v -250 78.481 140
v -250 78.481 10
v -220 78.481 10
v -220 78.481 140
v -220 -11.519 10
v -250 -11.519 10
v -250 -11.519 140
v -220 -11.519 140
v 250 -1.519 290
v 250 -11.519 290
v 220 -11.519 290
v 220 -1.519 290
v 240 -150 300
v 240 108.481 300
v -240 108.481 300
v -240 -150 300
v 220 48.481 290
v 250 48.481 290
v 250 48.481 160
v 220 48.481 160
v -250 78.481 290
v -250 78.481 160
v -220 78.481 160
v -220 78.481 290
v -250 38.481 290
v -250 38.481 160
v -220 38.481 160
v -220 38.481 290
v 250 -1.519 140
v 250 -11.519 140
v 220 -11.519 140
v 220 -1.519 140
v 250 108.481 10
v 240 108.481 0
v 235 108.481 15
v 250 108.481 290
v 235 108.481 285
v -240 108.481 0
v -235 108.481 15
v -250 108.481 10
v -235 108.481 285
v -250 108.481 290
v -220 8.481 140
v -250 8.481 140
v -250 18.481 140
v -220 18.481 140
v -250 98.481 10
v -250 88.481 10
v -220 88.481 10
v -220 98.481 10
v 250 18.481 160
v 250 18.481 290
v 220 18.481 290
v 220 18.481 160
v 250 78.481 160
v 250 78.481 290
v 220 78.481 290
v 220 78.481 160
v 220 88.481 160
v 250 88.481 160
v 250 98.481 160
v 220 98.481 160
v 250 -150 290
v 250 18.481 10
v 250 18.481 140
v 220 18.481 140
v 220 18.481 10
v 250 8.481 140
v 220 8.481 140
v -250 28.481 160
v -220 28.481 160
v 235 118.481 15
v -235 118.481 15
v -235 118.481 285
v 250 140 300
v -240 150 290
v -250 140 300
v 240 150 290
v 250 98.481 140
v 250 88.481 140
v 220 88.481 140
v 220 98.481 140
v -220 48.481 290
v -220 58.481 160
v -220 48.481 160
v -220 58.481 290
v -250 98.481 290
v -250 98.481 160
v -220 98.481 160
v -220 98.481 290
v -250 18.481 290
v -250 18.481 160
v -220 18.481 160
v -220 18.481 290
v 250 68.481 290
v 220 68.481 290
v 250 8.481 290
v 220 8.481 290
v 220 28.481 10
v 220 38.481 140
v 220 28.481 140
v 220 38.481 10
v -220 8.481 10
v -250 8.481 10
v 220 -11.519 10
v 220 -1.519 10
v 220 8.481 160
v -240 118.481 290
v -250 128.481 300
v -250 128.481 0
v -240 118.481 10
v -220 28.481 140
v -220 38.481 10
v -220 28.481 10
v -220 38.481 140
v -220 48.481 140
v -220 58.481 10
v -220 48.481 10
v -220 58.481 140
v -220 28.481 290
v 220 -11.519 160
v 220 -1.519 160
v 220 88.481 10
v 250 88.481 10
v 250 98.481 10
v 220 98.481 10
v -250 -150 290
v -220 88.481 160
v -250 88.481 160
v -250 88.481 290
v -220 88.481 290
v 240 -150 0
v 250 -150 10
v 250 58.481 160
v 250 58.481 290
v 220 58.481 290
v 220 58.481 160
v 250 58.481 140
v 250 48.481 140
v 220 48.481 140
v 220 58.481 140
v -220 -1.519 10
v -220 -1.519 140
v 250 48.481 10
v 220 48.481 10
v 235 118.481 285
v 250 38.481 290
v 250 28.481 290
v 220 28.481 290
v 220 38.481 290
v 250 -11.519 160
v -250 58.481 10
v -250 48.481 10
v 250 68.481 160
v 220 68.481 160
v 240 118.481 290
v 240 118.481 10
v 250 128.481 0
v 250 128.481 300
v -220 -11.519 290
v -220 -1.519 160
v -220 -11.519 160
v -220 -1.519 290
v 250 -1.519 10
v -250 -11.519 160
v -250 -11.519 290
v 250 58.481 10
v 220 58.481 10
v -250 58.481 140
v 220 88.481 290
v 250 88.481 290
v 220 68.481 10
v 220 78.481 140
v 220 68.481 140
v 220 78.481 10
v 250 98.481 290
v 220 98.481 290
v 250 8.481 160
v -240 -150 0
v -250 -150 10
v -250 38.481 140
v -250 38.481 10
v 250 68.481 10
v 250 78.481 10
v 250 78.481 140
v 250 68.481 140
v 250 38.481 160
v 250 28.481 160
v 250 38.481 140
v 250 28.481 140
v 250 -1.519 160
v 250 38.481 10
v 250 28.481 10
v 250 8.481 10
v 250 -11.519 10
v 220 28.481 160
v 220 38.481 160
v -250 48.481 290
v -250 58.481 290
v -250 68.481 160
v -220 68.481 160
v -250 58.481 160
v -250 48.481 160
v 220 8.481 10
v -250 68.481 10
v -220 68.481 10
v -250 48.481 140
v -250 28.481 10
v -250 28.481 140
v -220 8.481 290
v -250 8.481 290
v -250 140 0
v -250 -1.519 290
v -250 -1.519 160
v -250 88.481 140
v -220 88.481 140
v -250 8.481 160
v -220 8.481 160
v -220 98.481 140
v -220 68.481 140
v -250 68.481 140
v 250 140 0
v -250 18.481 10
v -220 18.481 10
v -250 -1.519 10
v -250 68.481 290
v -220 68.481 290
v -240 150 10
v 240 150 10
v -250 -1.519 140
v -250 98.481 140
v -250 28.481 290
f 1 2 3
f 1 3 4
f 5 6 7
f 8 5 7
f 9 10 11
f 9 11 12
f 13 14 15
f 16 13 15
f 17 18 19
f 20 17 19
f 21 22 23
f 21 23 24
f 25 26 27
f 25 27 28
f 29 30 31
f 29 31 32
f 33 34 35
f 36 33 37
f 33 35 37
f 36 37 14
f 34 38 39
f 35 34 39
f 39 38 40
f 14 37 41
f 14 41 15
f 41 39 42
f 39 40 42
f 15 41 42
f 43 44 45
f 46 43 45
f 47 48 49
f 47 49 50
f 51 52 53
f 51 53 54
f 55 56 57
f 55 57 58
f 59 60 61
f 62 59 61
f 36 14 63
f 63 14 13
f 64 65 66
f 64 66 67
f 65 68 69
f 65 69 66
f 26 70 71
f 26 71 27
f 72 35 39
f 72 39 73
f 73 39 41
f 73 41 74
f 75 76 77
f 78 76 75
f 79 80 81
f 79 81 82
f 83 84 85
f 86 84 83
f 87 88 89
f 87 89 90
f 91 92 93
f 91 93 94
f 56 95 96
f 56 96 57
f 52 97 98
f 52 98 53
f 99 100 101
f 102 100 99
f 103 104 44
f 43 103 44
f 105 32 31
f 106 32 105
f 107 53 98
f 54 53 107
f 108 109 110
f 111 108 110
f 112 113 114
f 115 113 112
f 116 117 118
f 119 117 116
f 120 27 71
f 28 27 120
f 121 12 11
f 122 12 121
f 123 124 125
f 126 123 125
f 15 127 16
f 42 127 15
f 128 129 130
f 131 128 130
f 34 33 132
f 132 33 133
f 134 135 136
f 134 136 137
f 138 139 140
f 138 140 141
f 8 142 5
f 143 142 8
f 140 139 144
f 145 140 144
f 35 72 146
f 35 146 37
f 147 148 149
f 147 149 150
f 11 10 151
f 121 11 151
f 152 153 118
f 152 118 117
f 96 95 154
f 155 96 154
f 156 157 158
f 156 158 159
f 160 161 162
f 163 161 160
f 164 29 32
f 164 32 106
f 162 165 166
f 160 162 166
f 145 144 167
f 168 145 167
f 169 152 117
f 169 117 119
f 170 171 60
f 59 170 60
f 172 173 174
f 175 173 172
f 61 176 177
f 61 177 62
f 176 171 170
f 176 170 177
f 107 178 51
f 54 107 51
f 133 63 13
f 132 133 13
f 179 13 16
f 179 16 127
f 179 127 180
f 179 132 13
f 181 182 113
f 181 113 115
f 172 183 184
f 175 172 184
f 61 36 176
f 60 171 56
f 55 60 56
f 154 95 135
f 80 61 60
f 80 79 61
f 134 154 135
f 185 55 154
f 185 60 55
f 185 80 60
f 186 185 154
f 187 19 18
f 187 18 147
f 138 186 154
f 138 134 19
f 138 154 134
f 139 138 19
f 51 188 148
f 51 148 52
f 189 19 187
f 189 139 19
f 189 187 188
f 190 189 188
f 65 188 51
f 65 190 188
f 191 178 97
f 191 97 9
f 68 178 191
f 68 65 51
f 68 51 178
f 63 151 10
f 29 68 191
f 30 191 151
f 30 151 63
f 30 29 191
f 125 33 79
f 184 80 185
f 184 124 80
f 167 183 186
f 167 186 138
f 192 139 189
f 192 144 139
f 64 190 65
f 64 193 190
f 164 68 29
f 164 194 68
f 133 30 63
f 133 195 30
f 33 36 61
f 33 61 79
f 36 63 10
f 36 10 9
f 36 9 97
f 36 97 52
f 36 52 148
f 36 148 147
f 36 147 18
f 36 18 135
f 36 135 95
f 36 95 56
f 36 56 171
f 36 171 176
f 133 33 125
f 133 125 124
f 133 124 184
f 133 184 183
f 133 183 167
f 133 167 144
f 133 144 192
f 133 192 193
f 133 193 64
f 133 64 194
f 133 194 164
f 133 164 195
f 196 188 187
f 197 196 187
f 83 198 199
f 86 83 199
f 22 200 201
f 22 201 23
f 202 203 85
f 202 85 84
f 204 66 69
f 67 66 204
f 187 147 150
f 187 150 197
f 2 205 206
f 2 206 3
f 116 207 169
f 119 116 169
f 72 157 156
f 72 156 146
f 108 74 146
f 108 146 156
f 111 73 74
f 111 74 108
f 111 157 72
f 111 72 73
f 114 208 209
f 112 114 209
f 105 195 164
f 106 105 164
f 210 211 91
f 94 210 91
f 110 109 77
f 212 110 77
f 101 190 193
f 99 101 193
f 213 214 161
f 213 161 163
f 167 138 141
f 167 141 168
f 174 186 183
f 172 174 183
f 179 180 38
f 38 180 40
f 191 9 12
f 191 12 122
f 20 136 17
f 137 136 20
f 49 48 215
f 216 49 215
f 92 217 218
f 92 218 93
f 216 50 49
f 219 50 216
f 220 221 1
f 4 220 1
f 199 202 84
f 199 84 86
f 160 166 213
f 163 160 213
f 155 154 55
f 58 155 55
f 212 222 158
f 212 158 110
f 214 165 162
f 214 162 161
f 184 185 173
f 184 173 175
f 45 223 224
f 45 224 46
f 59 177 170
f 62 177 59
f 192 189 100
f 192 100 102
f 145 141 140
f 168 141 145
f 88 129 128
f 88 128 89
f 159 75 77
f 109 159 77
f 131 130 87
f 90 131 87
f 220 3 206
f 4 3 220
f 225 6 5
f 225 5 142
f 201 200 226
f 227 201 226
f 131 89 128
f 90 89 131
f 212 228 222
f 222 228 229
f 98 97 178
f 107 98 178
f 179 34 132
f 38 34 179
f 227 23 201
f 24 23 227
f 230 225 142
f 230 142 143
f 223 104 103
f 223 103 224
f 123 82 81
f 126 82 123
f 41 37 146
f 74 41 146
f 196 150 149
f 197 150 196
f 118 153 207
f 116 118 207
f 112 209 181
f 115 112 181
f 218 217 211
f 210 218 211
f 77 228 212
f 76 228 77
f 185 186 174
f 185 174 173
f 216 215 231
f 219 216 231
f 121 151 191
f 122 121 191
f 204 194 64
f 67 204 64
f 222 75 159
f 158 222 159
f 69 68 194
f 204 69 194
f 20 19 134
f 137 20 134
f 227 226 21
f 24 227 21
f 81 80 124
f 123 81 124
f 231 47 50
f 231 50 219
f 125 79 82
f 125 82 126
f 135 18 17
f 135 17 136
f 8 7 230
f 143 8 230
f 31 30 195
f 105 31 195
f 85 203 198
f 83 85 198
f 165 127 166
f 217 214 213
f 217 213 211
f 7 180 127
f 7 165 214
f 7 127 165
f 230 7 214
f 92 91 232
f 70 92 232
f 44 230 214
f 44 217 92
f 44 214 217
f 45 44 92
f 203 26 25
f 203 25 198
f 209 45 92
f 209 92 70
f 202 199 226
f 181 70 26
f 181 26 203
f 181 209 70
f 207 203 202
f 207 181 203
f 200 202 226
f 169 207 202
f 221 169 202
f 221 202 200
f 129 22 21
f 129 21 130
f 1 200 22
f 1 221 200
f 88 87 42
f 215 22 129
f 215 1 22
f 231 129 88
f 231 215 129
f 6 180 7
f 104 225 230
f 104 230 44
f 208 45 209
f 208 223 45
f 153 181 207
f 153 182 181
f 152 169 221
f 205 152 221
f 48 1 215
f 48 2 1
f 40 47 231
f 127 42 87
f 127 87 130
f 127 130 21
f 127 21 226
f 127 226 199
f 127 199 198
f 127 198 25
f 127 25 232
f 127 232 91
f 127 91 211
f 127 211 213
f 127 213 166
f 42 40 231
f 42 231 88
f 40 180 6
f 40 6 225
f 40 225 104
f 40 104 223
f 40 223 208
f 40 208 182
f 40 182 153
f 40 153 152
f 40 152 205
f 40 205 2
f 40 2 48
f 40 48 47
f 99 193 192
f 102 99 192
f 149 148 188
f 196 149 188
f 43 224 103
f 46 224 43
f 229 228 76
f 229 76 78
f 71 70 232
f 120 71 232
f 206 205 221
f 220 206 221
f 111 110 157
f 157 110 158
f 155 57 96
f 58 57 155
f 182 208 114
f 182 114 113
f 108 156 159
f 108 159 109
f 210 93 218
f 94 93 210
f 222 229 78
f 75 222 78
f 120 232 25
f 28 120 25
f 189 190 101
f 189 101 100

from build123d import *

# Parameters (mm, degrees)
BOSS_EXTRUDE1_DEPTH = 300
SKETCH2_W           = 15
SKETCH2_H           = 10
CUT_EXTRUDE1_DEPTH  = 603.07972894
SKETCH4_W           = 130
SKETCH4_H           = 10
CUT_EXTRUDE2_DEPTH  = 30
SKETCH7_W           = 130
SKETCH7_H           = 10
CUT_EXTRUDE3_DEPTH  = 30
CHAMFER1_SIZE       = 10
CHAMFER2_SIZE       = 10
CHAMFER3_SIZE       = 10


with BuildPart() as part:
    # Sketch1 → Boss-Extrude1 (new body)
    with BuildSketch(Plane.XY):
        Polygon((250, 118.480565371), (235, 118.480565371), (235, 108.480565371), (250, 108.480565371), (250, -150), (-250, -150), (-250, 108.480565371), (-235, 108.480565371), (-235, 118.480565371), (-250, 118.480565371), (-250, 150), (250, 150), align=None)
    extrude(amount=BOSS_EXTRUDE1_DEPTH)

    # Sketch2 → Cut-Extrude1 (cut, through all)
    with BuildSketch(Plane.ZY.offset(250)):
        with Locations((292.5, 113.480565371)):
            Rectangle(SKETCH2_W, SKETCH2_H)
        with Locations((7.5, 113.480565371)):
            Rectangle(SKETCH2_W, SKETCH2_H)
    extrude(amount=-CUT_EXTRUDE1_DEPTH, mode=Mode.SUBTRACT)

    # Sketch4 → Cut-Extrude2 (cut)
    with BuildSketch(Plane.ZY.offset(250)):
        with Locations((75, 93.480565371)):
            Rectangle(SKETCH4_W, SKETCH4_H)
        with Locations((225, 93.480565371)):
            Rectangle(SKETCH4_W, SKETCH4_H)
        with Locations((225, 73.480565371)):
            Rectangle(SKETCH4_W, SKETCH4_H)
        with Locations((225, 53.480565371)):
            Rectangle(SKETCH4_W, SKETCH4_H)
        with Locations((225, 33.480565371)):
            Rectangle(SKETCH4_W, SKETCH4_H)
        with Locations((225, 13.480565371)):
            Rectangle(SKETCH4_W, SKETCH4_H)
        with Locations((225, -6.519434629)):
            Rectangle(SKETCH4_W, SKETCH4_H)
        with Locations((75, 73.480565371)):
            Rectangle(SKETCH4_W, SKETCH4_H)
        with Locations((75, 53.480565371)):
            Rectangle(SKETCH4_W, SKETCH4_H)
        with Locations((75, 33.480565371)):
            Rectangle(SKETCH4_W, SKETCH4_H)
        with Locations((75, 13.480565371)):
            Rectangle(SKETCH4_W, SKETCH4_H)
        with Locations((75, -6.519434629)):
            Rectangle(SKETCH4_W, SKETCH4_H)
    extrude(amount=-CUT_EXTRUDE2_DEPTH, mode=Mode.SUBTRACT)

    # Sketch7 → Cut-Extrude3 (cut)
    with BuildSketch(Plane(origin=(250, 0, 0), x_dir=(0, 0, -1), z_dir=(1, 0, 0))):
        with Locations((-225, 93.480565371)):
            Rectangle(SKETCH7_W, SKETCH7_H)
        with Locations((-75, 93.480565371)):
            Rectangle(SKETCH7_W, SKETCH7_H)
        with Locations((-75, 73.480565371)):
            Rectangle(SKETCH7_W, SKETCH7_H)
        with Locations((-75, 53.480565371)):
            Rectangle(SKETCH7_W, SKETCH7_H)
        with Locations((-75, 33.480565371)):
            Rectangle(SKETCH7_W, SKETCH7_H)
        with Locations((-75, 13.480565371)):
            Rectangle(SKETCH7_W, SKETCH7_H)
        with Locations((-75, -6.519434629)):
            Rectangle(SKETCH7_W, SKETCH7_H)
        with Locations((-225, 73.480565371)):
            Rectangle(SKETCH7_W, SKETCH7_H)
        with Locations((-225, 53.480565371)):
            Rectangle(SKETCH7_W, SKETCH7_H)
        with Locations((-225, 33.480565371)):
            Rectangle(SKETCH7_W, SKETCH7_H)
        with Locations((-225, 13.480565371)):
            Rectangle(SKETCH7_W, SKETCH7_H)
        with Locations((-225, -6.519434629)):
            Rectangle(SKETCH7_W, SKETCH7_H)
    extrude(amount=-CUT_EXTRUDE3_DEPTH, mode=Mode.SUBTRACT)

    # Chamfer1
    chamfer1_edges = [part.edges().sort_by_distance(p)[0] for p in [
        (0, 150, 0),
        (-250, 150, 150),
        (250, 150, 150),
        (0, 150, 300),
    ]]
    chamfer(chamfer1_edges, length=CHAMFER1_SIZE)

    # Chamfer2
    chamfer2_edges = [part.edges().sort_by_distance(p)[0] for p in [
        (0, 118.480565371, 0),
        (-250, 118.480565371, 150),
        (250, 118.480565371, 150),
        (0, 118.480565371, 300),
    ]]
    chamfer(chamfer2_edges, length=CHAMFER2_SIZE)

    # Chamfer3
    chamfer3_edges = [part.edges().sort_by_distance(p)[0] for p in [
        (250, -20.759717314, 300),
        (250, -20.759717314, 0),
        (-250, -20.759717314, 0),
        (-250, -20.759717314, 300),
    ]]
    chamfer(chamfer3_edges, length=CHAMFER3_SIZE - 0.0001)  # a hair under: the kernel refuses the full size


solid = part.part
